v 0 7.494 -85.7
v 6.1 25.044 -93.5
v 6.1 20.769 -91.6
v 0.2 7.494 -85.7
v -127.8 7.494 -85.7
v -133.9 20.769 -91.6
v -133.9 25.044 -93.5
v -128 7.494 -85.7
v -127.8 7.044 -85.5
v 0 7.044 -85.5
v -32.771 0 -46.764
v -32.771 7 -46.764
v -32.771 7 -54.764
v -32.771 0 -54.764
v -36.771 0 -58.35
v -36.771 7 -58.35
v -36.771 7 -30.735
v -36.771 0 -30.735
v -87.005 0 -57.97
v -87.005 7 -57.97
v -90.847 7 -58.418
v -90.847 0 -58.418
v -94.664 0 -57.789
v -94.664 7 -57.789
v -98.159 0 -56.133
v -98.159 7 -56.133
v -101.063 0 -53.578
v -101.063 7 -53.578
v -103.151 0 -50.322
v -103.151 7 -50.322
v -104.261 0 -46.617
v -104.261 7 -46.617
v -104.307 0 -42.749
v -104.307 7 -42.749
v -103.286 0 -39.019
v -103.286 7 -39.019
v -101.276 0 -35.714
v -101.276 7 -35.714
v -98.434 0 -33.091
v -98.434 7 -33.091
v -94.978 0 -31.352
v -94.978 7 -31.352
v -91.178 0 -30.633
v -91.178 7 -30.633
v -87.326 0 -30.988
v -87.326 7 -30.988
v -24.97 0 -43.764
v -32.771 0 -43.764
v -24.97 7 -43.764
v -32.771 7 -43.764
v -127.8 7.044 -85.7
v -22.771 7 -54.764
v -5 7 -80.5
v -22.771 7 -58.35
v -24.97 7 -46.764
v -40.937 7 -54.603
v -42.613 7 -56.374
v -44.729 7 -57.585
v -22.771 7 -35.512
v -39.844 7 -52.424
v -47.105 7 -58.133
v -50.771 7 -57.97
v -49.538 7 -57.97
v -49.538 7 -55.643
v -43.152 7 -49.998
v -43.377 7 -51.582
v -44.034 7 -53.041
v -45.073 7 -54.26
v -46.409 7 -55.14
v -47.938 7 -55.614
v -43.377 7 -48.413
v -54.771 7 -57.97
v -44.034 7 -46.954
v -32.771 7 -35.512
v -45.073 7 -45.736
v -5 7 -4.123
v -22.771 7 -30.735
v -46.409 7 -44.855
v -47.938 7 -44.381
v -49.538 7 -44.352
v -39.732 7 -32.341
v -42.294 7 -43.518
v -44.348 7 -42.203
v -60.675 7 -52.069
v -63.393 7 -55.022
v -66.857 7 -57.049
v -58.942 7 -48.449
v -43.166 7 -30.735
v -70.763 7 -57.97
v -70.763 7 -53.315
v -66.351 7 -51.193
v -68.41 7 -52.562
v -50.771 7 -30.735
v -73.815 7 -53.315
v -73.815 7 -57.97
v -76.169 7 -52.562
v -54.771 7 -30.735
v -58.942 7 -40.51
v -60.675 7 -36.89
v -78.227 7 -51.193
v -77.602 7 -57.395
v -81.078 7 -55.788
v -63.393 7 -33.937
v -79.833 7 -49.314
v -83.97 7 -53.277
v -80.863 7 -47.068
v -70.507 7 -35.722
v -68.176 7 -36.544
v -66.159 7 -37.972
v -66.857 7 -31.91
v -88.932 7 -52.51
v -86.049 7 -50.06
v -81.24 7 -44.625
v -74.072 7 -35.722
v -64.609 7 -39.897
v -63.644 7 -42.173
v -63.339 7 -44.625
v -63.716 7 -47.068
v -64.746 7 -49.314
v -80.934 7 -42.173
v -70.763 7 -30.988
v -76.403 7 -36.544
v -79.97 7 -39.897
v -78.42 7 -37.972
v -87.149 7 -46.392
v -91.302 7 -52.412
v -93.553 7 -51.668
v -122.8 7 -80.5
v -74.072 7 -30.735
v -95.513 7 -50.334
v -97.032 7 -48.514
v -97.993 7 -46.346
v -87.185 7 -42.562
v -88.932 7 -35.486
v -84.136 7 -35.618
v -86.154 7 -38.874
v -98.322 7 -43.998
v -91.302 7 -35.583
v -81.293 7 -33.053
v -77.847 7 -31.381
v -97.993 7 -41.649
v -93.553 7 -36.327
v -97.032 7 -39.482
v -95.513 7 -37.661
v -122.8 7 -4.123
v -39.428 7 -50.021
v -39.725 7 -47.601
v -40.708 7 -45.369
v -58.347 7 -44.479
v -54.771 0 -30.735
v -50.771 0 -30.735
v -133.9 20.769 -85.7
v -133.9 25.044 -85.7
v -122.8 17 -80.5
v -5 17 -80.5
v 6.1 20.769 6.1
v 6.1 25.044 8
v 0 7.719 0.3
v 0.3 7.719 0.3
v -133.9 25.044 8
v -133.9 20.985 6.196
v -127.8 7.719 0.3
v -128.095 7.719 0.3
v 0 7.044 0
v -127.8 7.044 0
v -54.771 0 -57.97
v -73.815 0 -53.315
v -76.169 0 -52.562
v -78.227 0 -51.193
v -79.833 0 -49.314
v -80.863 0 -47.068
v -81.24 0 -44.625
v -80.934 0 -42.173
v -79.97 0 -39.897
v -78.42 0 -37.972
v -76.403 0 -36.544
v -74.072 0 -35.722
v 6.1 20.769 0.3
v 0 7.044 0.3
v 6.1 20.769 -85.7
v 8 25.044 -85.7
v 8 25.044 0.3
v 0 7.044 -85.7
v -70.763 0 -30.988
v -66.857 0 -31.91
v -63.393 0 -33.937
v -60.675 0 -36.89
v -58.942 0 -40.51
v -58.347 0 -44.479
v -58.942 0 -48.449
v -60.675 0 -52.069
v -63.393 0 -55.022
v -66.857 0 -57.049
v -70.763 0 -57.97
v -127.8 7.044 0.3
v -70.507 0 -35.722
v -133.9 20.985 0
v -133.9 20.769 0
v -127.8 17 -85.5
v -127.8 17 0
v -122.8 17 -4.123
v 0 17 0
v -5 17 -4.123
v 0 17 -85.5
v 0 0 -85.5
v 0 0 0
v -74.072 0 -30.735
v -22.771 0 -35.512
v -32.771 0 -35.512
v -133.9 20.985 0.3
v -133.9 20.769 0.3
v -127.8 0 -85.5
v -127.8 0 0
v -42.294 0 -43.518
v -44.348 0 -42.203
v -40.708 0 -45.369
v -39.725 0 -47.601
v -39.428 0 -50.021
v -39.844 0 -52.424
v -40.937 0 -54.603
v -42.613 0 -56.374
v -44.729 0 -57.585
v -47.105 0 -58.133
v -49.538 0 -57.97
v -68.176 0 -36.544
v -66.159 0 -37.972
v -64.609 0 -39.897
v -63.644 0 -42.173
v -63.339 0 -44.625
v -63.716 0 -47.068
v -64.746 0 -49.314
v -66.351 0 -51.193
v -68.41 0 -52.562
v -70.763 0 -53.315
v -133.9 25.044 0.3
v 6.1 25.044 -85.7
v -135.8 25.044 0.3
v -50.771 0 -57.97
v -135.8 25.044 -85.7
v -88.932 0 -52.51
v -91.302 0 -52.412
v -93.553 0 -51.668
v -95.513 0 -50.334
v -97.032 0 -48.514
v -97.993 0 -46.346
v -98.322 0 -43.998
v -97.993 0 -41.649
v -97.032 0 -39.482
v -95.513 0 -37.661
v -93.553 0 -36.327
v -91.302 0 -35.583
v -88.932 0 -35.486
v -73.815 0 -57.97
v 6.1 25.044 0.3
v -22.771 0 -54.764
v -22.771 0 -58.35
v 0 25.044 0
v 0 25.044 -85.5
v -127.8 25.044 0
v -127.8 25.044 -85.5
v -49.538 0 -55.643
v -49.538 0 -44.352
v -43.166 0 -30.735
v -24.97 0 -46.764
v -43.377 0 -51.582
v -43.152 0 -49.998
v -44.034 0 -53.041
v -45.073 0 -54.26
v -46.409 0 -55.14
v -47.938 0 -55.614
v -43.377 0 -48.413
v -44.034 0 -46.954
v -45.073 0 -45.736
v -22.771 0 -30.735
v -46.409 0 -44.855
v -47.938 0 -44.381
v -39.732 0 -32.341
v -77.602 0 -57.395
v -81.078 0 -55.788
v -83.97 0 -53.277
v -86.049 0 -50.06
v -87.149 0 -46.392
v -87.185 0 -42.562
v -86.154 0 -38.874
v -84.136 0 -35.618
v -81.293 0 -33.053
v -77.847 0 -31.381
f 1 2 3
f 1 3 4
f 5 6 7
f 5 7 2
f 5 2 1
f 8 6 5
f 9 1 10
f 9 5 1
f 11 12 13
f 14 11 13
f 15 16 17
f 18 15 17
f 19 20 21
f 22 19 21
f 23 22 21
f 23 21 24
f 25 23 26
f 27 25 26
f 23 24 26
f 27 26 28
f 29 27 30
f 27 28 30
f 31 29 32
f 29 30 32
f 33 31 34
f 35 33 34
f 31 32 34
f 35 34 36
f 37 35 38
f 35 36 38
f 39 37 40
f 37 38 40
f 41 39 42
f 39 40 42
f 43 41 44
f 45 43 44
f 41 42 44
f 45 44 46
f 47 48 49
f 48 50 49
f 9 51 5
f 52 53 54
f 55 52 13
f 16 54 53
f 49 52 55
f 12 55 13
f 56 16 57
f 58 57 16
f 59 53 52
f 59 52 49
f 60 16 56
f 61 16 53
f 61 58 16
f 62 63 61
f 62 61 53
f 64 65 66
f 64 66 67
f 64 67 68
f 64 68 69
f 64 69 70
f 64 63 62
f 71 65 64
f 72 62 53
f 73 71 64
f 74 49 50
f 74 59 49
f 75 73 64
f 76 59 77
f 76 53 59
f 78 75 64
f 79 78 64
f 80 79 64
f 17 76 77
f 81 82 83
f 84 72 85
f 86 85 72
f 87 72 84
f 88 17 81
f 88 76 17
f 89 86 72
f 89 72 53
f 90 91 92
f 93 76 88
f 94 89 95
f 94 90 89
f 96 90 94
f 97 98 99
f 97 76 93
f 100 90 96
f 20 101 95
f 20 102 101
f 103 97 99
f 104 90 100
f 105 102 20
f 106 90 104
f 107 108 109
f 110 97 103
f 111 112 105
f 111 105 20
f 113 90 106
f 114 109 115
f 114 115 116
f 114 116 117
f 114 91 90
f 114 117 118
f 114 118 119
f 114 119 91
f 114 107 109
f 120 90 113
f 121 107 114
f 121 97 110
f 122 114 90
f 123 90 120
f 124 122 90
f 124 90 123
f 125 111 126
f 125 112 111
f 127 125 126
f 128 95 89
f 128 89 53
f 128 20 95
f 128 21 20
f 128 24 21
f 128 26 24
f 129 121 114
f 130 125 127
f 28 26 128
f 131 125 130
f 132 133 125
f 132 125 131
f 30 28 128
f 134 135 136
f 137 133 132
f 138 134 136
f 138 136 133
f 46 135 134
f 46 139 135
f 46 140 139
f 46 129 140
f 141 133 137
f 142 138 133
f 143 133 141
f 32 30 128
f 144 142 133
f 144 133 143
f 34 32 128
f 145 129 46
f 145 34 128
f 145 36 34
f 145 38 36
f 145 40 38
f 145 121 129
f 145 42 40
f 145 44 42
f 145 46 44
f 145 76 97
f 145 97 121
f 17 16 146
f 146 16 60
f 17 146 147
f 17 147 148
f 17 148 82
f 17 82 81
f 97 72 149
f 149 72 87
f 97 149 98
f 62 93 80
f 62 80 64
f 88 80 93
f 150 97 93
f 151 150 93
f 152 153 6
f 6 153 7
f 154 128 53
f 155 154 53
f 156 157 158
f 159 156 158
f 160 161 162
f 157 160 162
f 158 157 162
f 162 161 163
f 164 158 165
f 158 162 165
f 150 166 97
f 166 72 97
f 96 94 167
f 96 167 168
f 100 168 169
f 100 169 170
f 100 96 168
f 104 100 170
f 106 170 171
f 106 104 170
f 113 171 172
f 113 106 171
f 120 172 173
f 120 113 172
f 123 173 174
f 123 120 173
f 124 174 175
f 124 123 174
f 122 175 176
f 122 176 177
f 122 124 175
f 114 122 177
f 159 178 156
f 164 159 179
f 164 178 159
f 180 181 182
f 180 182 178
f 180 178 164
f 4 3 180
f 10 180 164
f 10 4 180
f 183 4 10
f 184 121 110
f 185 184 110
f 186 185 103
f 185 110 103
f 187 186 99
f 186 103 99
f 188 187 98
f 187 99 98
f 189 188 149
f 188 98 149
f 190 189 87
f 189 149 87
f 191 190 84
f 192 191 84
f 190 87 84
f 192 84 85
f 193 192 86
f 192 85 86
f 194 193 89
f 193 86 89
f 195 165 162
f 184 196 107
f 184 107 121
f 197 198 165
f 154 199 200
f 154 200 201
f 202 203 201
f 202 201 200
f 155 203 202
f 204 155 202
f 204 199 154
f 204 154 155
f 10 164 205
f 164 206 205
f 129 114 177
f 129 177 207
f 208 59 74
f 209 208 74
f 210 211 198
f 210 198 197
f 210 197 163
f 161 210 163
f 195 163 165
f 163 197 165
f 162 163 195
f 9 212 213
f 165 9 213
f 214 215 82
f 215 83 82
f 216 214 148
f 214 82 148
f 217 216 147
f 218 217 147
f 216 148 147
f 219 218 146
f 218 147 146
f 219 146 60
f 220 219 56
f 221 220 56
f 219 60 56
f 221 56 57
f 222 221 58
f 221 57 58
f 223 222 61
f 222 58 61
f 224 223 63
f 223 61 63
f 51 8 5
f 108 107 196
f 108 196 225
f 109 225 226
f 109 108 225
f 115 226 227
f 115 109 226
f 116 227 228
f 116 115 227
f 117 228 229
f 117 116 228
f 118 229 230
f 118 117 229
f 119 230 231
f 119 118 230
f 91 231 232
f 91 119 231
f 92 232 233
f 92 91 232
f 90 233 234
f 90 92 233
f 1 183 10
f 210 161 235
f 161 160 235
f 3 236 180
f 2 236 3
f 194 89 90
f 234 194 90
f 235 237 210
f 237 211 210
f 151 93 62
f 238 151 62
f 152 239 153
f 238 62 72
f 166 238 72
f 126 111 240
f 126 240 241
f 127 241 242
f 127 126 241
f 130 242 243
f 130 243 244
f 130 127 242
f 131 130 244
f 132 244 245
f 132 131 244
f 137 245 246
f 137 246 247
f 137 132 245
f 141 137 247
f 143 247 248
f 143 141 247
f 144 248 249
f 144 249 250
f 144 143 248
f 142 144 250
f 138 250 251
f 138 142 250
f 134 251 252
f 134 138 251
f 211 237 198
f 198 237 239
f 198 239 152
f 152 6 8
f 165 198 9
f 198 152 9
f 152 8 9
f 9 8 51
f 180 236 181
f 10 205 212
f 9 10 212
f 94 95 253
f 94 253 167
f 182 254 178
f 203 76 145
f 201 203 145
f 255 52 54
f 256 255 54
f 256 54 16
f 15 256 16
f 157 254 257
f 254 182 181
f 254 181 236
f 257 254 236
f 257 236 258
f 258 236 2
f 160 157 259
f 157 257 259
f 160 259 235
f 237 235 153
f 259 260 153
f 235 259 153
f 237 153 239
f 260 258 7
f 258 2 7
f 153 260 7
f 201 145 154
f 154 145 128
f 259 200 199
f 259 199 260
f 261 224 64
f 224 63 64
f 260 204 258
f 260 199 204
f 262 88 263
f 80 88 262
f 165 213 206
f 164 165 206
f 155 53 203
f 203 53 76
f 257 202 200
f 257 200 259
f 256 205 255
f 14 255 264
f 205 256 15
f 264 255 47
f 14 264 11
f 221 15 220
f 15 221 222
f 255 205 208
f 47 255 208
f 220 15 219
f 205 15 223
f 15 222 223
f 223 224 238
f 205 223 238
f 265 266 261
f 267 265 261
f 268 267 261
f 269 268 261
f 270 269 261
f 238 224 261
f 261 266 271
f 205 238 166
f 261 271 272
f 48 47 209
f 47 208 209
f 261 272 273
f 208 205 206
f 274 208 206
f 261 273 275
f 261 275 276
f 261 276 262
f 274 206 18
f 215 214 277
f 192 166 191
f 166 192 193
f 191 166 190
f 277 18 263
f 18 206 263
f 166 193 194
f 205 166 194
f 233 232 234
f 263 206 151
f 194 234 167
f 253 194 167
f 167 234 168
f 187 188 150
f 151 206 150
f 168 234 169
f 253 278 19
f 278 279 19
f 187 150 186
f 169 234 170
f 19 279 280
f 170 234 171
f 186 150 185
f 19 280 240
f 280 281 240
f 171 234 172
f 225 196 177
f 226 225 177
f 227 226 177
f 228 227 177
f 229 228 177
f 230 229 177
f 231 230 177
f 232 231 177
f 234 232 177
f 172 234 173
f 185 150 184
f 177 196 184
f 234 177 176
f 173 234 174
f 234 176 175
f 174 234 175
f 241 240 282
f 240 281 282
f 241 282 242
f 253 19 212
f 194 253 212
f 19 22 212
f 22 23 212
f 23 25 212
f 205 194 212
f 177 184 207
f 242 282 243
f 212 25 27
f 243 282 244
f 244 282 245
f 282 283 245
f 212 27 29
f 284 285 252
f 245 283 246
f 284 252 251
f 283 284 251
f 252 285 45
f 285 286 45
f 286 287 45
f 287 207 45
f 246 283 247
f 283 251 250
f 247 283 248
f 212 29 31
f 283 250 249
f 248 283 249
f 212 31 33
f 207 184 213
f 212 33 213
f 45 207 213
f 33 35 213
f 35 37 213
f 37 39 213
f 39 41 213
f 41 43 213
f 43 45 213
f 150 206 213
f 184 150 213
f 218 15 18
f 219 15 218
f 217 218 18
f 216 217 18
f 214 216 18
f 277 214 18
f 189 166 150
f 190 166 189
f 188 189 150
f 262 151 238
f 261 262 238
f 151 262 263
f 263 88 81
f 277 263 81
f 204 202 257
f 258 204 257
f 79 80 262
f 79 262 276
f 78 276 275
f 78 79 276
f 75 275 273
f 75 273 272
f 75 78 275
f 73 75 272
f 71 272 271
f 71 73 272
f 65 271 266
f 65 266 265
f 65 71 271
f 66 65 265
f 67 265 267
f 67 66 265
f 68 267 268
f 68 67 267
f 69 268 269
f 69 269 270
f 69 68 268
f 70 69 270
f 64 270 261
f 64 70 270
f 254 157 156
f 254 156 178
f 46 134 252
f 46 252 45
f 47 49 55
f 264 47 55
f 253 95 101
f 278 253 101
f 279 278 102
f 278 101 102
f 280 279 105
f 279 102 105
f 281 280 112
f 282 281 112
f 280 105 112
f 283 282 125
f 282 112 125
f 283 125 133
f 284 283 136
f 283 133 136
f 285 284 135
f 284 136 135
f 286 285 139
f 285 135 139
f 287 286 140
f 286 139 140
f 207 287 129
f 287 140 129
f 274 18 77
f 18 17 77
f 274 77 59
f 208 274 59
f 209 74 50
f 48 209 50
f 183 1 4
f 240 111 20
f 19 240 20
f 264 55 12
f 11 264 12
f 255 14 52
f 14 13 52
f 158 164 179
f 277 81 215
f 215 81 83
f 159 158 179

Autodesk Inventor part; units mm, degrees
ref_plane "YZ Plane" through (0, 0, 0) normal (1, 0, 0) x (0, 1, 0)
ref_plane "XZ Plane" through (0, 0, 0) normal (0, 1, 0) x (-1, 0, 0)
ref_plane "XY Plane" through (0, 0, 0) normal (0, 0, 1) x (1, 0, 0)
sketch "Sketch1" plane through (0, 0, 0) normal (0, 1, 0) x (-1, 0, 0)
  line L0 (0, 0) -> (0, -85.5)
  line L1 (0, -85.5) -> (127.8, -85.5)
  line L2 (127.8, -85.5) -> (127.8, 0)
  line L3 (127.8, 0) -> (0, 0)
  dimension "d0" = 85.5
  dimension "d1" = 127.8
extrude "Extrusion2" add sketch "Sketch1" along normal blind 7
sketch "Sketch3" plane through (0, 7, 0) normal (0, 1, 0) x (1, 0, 0)
  point P0 (0, 0)
sketch "Sketch4" plane through (0, 7, 0) normal (0, 1, 0) x (1, 0, 0)
  arc A0 (-87.0052, 57.9703) -> (-87.3264, 30.9885) centre (-90.5182, 44.5193) ccw
  arc A1 (-88.9325, 52.5097) -> (-88.9325, 35.4855) centre (-89.7687, 43.9976) ccw
  line L0 (-88.9325, 52.5097) -> (-87.0052, 57.9703)
  line L1 (-88.9325, 35.4855) -> (-87.3264, 30.9885)
  arc A2 (-73.8153, 53.315) -> (-74.072, 35.7223) centre (-72.2893, 44.4945) ccw
  arc A3 (-70.5066, 35.7223) -> (-70.7634, 53.315) centre (-72.2893, 44.4945) ccw
  arc A4 (-70.7634, 30.9885) -> (-70.7634, 57.9703) centre (-71.8849, 44.4794) ccw
  line L2 (-70.7634, 57.9703) -> (-70.7634, 53.315)
  line L3 (-70.5066, 35.7223) -> (-70.7634, 30.9885)
  line L4 (-74.072, 35.7223) -> (-74.072, 30.7346)
  line L5 (-73.8153, 57.9703) -> (-73.8153, 53.315)
  arc A5 (-73.8153, 57.9703) -> (-74.072, 30.7346) centre (-73.6823, 44.35) ccw
  line L6 (-54.7714, 57.9703) -> (-54.7714, 30.7346)
  line L7 (-54.7714, 30.7346) -> (-50.7714, 30.7346)
  line L8 (-50.7714, 30.7346) -> (-50.7714, 57.9703)
  line L9 (-50.7714, 57.9703) -> (-54.7714, 57.9703)
  line L10 (-43.1656, 30.7346) -> (-49.5383, 44.3525)
  arc A6 (-49.5383, 44.3525) -> (-49.5383, 55.6427) centre (-48.8397, 49.9976) ccw
  line L11 (-43.1656, 30.7346) -> (-39.7325, 32.3411)
  line L12 (-39.7325, 32.3411) -> (-44.3475, 42.2031)
  arc A7 (-44.3475, 42.2031) -> (-49.5383, 57.9703) centre (-47.7714, 49.814) ccw
  line L13 (-49.5383, 57.9703) -> (-49.5383, 55.6427)
  line L14 (-36.7714, 58.3504) -> (-36.7714, 30.7346)
  line L15 (-36.7714, 30.7346) -> (-22.7714, 30.7346)
  line L16 (-22.7714, 30.7346) -> (-22.7714, 35.5125)
  line L17 (-22.7714, 35.5125) -> (-32.7714, 35.5125)
  line L18 (-32.7714, 35.5125) -> (-32.7714, 43.7637)
  line L19 (-32.7714, 43.7637) -> (-24.9696, 43.7637)
  line L20 (-24.9696, 43.7637) -> (-24.9696, 46.7637)
  line L21 (-24.9696, 46.7637) -> (-32.7714, 46.7637)
  line L22 (-32.7714, 46.7637) -> (-32.7714, 54.7637)
  line L23 (-32.7714, 54.7637) -> (-22.7714, 54.7637)
  line L24 (-22.7714, 54.7637) -> (-22.7714, 58.3504)
  line L25 (-22.7714, 58.3504) -> (-36.7714, 58.3504)
  line L26 (-127.8, 85.5) -> (-127.8, 0) projected
  line L27 (0, 85.5) -> (-127.8, 85.5) projected
  point P0 (0, 0)
extrude "Extrusion3" cut sketch "Sketch4" against normal through all
sketch "Sketch5" plane through (0, 7, 0) normal (0, 1, 0) x (1, 0, 0)
  line L0 (-127.8, 0) -> (0, 0) projected
  line L1 (-127.8, 0) -> (0, 0)
  line L2 (0, 0) -> (0, 85.5) projected
  line L3 (0, 0) -> (0, 85.5)
  line L4 (0, 85.5) -> (-127.8, 85.5) projected
  line L5 (0, 85.5) -> (-127.8, 85.5)
  line L6 (-127.8, 85.5) -> (-127.8, 0)
  line L7 (-122.8, 80.5) -> (-5, 80.5)
  line L8 (-5, 80.5) -> (-5, 4.1226)
  line L9 (-5, 4.1226) -> (-122.8, 4.1226)
  line L10 (-122.8, 4.1226) -> (-122.8, 80.5)
  line L11 (-127.8, 85.5) -> (-127.8, 0) projected
  dimension "d44" = 5
  dimension "d45" = 5
  dimension "d46" = 5
extrude "Extrusion4" add sketch "Sketch5" along normal blind 10
sketch "Sketch9" plane through (0, 17, 0) normal (0, 1, 0) x (1, 0, 0)
  line L0 (-127.8, 85.5) -> (-127.8, 0) projected
  line L1 (-127.8, 0) -> (-127.8, 85.5)
  line L2 (-127.8, 85.5) -> (0, 85.5)
  line L3 (0, 85.5) -> (0, 0)
  line L4 (0, 0) -> (-127.8, 0)
  line L5 (-122.8, 4.1226) -> (-5, 4.1226) projected
  line L6 (-5, 80.5) -> (-122.8, 80.5) projected
  line L7 (-122.8, 4.1226) -> (-122.8, 80.5)
  line L8 (-122.8, 80.5) -> (-5, 80.5)
  line L9 (-5, 80.5) -> (-5, 4.1226)
  line L10 (-5, 4.1226) -> (-122.8, 4.1226)
  point P0 (0, 0)
ref_plane "Work Plane4" through (-63.9, 0, 0) normal (1, 0, 0) x (0, 0, -1)
sketch "Sketch21" plane through (-63.9, 0, 0) normal (1, 0, 0) x (0, 0, -1)
  line L0 (0, 0) -> (0, 17) projected
  line L1 (0, 7.0438) -> (0, 25.0438)
  line L2 (0, 25.0438) -> (-8, 25.0438)
  line L3 (-8, 25.0438) -> (0, 7.0438)
  line L4 (85.5, 0) -> (85.5, 17) projected
  line L5 (85.5, 7.0438) -> (85.5, 25.0438)
  line L6 (85.5, 25.0438) -> (93.5, 25.0438)
  line L7 (93.5, 25.0438) -> (85.5, 7.0438)
  dimension "d99" = 18
  dimension "d100" = 8
  dimension "d101" = 18
  dimension "d102" = 8
extrude "Extrusion7" add sketch "Sketch21" along normal mid plane 140
ref_plane "Work Plane5" through (-127.8, 0, -42.7) normal (0, 0, 1) x (1, 0, 0)
sketch "Sketch22" plane through (-127.8, 0, -42.7) normal (0, 0, 1) x (1, 0, 0)
  line L0 (127.8, 7.0438) -> (133.9, 7.0438) projected
  line L1 (127.8, 7.0438) -> (127.8, 25.0438)
  line L2 (133.9, 25.0438) -> (-6.1, 25.0438) projected
  line L3 (127.8, 25.0438) -> (135.8, 25.0438)
  line L4 (135.8, 25.0438) -> (127.8, 7.0438)
  line L5 (0, 0) -> (0, 7.0438) projected
  line L6 (0, 7.0438) -> (0, 25.0438)
  line L7 (0, 25.0438) -> (-8, 25.0438)
  line L8 (-6.1, 7.0438) -> (0, 7.0438) projected
  line L9 (-8, 25.0438) -> (0, 7.0438)
  point P0 (127.8, 0)
  dimension "d106" = 8
  dimension "d107" = 8
extrude "Extrusion8" add sketch "Sketch22" along normal mid plane 86
sketch "Sketch24" plane through (-127.8, 0, 0) normal (0, 0, 1) x (1, 0, 0)
  line L0 (-6.1, 7.0438) -> (-6.1, 25.0438) projected
  line L1 (0, 7.0438) -> (127.8, 7.0438) projected
  line L2 (-6.1, 20.9849) -> (0, 7.0438)
  line L3 (0, 7.0438) -> (-6.1, 7.0438)
  line L4 (-6.1, 7.0438) -> (-6.1, 20.9849)
  line L5 (127.8, 7.0438) -> (133.9, 7.0438) projected
  line L6 (133.9, 7.0438) -> (133.9, 20.7688) projected
  line L7 (127.8, 7.0438) -> (133.9, 20.7688)
  line L8 (133.9, 20.7688) -> (133.9, 7.0438)
  line L9 (133.9, 7.0438) -> (127.8, 7.0438)
  point P0 (127.8, 0)
extrude "Extrusion9" cut sketch "Sketch24" along normal blind 86
sketch "Sketch25" plane through (0, 0, -85.5) normal (0, 0, -1) x (-1, 0, 0)
  line L0 (-6.1, 20.7688) -> (0, 7.0438) projected
  line L1 (0, 7.0438) -> (-6.1, 20.7688)
  line L2 (-6.1, 20.7688) -> (-6.1, 7.0438)
  line L3 (-6.1, 7.0438) -> (0, 7.0438)
  line L4 (127.8, 7.0438) -> (133.9, 20.7688) projected
  line L5 (127.8, 7.0438) -> (133.9, 20.7688)
  line L6 (133.9, 7.0438) -> (133.9, 20.7688) projected
  line L7 (133.9, 20.7688) -> (133.9, 7.0438)
  line L8 (127.8, 7.0438) -> (0, 7.0438) projected
  line L9 (133.9, 7.0438) -> (127.8, 7.0438)
  point P0 (0, 0)
extrude "Extrusion10" cut sketch "Sketch25" along normal blind 86
properties part number "Rack holder Kinpen"
